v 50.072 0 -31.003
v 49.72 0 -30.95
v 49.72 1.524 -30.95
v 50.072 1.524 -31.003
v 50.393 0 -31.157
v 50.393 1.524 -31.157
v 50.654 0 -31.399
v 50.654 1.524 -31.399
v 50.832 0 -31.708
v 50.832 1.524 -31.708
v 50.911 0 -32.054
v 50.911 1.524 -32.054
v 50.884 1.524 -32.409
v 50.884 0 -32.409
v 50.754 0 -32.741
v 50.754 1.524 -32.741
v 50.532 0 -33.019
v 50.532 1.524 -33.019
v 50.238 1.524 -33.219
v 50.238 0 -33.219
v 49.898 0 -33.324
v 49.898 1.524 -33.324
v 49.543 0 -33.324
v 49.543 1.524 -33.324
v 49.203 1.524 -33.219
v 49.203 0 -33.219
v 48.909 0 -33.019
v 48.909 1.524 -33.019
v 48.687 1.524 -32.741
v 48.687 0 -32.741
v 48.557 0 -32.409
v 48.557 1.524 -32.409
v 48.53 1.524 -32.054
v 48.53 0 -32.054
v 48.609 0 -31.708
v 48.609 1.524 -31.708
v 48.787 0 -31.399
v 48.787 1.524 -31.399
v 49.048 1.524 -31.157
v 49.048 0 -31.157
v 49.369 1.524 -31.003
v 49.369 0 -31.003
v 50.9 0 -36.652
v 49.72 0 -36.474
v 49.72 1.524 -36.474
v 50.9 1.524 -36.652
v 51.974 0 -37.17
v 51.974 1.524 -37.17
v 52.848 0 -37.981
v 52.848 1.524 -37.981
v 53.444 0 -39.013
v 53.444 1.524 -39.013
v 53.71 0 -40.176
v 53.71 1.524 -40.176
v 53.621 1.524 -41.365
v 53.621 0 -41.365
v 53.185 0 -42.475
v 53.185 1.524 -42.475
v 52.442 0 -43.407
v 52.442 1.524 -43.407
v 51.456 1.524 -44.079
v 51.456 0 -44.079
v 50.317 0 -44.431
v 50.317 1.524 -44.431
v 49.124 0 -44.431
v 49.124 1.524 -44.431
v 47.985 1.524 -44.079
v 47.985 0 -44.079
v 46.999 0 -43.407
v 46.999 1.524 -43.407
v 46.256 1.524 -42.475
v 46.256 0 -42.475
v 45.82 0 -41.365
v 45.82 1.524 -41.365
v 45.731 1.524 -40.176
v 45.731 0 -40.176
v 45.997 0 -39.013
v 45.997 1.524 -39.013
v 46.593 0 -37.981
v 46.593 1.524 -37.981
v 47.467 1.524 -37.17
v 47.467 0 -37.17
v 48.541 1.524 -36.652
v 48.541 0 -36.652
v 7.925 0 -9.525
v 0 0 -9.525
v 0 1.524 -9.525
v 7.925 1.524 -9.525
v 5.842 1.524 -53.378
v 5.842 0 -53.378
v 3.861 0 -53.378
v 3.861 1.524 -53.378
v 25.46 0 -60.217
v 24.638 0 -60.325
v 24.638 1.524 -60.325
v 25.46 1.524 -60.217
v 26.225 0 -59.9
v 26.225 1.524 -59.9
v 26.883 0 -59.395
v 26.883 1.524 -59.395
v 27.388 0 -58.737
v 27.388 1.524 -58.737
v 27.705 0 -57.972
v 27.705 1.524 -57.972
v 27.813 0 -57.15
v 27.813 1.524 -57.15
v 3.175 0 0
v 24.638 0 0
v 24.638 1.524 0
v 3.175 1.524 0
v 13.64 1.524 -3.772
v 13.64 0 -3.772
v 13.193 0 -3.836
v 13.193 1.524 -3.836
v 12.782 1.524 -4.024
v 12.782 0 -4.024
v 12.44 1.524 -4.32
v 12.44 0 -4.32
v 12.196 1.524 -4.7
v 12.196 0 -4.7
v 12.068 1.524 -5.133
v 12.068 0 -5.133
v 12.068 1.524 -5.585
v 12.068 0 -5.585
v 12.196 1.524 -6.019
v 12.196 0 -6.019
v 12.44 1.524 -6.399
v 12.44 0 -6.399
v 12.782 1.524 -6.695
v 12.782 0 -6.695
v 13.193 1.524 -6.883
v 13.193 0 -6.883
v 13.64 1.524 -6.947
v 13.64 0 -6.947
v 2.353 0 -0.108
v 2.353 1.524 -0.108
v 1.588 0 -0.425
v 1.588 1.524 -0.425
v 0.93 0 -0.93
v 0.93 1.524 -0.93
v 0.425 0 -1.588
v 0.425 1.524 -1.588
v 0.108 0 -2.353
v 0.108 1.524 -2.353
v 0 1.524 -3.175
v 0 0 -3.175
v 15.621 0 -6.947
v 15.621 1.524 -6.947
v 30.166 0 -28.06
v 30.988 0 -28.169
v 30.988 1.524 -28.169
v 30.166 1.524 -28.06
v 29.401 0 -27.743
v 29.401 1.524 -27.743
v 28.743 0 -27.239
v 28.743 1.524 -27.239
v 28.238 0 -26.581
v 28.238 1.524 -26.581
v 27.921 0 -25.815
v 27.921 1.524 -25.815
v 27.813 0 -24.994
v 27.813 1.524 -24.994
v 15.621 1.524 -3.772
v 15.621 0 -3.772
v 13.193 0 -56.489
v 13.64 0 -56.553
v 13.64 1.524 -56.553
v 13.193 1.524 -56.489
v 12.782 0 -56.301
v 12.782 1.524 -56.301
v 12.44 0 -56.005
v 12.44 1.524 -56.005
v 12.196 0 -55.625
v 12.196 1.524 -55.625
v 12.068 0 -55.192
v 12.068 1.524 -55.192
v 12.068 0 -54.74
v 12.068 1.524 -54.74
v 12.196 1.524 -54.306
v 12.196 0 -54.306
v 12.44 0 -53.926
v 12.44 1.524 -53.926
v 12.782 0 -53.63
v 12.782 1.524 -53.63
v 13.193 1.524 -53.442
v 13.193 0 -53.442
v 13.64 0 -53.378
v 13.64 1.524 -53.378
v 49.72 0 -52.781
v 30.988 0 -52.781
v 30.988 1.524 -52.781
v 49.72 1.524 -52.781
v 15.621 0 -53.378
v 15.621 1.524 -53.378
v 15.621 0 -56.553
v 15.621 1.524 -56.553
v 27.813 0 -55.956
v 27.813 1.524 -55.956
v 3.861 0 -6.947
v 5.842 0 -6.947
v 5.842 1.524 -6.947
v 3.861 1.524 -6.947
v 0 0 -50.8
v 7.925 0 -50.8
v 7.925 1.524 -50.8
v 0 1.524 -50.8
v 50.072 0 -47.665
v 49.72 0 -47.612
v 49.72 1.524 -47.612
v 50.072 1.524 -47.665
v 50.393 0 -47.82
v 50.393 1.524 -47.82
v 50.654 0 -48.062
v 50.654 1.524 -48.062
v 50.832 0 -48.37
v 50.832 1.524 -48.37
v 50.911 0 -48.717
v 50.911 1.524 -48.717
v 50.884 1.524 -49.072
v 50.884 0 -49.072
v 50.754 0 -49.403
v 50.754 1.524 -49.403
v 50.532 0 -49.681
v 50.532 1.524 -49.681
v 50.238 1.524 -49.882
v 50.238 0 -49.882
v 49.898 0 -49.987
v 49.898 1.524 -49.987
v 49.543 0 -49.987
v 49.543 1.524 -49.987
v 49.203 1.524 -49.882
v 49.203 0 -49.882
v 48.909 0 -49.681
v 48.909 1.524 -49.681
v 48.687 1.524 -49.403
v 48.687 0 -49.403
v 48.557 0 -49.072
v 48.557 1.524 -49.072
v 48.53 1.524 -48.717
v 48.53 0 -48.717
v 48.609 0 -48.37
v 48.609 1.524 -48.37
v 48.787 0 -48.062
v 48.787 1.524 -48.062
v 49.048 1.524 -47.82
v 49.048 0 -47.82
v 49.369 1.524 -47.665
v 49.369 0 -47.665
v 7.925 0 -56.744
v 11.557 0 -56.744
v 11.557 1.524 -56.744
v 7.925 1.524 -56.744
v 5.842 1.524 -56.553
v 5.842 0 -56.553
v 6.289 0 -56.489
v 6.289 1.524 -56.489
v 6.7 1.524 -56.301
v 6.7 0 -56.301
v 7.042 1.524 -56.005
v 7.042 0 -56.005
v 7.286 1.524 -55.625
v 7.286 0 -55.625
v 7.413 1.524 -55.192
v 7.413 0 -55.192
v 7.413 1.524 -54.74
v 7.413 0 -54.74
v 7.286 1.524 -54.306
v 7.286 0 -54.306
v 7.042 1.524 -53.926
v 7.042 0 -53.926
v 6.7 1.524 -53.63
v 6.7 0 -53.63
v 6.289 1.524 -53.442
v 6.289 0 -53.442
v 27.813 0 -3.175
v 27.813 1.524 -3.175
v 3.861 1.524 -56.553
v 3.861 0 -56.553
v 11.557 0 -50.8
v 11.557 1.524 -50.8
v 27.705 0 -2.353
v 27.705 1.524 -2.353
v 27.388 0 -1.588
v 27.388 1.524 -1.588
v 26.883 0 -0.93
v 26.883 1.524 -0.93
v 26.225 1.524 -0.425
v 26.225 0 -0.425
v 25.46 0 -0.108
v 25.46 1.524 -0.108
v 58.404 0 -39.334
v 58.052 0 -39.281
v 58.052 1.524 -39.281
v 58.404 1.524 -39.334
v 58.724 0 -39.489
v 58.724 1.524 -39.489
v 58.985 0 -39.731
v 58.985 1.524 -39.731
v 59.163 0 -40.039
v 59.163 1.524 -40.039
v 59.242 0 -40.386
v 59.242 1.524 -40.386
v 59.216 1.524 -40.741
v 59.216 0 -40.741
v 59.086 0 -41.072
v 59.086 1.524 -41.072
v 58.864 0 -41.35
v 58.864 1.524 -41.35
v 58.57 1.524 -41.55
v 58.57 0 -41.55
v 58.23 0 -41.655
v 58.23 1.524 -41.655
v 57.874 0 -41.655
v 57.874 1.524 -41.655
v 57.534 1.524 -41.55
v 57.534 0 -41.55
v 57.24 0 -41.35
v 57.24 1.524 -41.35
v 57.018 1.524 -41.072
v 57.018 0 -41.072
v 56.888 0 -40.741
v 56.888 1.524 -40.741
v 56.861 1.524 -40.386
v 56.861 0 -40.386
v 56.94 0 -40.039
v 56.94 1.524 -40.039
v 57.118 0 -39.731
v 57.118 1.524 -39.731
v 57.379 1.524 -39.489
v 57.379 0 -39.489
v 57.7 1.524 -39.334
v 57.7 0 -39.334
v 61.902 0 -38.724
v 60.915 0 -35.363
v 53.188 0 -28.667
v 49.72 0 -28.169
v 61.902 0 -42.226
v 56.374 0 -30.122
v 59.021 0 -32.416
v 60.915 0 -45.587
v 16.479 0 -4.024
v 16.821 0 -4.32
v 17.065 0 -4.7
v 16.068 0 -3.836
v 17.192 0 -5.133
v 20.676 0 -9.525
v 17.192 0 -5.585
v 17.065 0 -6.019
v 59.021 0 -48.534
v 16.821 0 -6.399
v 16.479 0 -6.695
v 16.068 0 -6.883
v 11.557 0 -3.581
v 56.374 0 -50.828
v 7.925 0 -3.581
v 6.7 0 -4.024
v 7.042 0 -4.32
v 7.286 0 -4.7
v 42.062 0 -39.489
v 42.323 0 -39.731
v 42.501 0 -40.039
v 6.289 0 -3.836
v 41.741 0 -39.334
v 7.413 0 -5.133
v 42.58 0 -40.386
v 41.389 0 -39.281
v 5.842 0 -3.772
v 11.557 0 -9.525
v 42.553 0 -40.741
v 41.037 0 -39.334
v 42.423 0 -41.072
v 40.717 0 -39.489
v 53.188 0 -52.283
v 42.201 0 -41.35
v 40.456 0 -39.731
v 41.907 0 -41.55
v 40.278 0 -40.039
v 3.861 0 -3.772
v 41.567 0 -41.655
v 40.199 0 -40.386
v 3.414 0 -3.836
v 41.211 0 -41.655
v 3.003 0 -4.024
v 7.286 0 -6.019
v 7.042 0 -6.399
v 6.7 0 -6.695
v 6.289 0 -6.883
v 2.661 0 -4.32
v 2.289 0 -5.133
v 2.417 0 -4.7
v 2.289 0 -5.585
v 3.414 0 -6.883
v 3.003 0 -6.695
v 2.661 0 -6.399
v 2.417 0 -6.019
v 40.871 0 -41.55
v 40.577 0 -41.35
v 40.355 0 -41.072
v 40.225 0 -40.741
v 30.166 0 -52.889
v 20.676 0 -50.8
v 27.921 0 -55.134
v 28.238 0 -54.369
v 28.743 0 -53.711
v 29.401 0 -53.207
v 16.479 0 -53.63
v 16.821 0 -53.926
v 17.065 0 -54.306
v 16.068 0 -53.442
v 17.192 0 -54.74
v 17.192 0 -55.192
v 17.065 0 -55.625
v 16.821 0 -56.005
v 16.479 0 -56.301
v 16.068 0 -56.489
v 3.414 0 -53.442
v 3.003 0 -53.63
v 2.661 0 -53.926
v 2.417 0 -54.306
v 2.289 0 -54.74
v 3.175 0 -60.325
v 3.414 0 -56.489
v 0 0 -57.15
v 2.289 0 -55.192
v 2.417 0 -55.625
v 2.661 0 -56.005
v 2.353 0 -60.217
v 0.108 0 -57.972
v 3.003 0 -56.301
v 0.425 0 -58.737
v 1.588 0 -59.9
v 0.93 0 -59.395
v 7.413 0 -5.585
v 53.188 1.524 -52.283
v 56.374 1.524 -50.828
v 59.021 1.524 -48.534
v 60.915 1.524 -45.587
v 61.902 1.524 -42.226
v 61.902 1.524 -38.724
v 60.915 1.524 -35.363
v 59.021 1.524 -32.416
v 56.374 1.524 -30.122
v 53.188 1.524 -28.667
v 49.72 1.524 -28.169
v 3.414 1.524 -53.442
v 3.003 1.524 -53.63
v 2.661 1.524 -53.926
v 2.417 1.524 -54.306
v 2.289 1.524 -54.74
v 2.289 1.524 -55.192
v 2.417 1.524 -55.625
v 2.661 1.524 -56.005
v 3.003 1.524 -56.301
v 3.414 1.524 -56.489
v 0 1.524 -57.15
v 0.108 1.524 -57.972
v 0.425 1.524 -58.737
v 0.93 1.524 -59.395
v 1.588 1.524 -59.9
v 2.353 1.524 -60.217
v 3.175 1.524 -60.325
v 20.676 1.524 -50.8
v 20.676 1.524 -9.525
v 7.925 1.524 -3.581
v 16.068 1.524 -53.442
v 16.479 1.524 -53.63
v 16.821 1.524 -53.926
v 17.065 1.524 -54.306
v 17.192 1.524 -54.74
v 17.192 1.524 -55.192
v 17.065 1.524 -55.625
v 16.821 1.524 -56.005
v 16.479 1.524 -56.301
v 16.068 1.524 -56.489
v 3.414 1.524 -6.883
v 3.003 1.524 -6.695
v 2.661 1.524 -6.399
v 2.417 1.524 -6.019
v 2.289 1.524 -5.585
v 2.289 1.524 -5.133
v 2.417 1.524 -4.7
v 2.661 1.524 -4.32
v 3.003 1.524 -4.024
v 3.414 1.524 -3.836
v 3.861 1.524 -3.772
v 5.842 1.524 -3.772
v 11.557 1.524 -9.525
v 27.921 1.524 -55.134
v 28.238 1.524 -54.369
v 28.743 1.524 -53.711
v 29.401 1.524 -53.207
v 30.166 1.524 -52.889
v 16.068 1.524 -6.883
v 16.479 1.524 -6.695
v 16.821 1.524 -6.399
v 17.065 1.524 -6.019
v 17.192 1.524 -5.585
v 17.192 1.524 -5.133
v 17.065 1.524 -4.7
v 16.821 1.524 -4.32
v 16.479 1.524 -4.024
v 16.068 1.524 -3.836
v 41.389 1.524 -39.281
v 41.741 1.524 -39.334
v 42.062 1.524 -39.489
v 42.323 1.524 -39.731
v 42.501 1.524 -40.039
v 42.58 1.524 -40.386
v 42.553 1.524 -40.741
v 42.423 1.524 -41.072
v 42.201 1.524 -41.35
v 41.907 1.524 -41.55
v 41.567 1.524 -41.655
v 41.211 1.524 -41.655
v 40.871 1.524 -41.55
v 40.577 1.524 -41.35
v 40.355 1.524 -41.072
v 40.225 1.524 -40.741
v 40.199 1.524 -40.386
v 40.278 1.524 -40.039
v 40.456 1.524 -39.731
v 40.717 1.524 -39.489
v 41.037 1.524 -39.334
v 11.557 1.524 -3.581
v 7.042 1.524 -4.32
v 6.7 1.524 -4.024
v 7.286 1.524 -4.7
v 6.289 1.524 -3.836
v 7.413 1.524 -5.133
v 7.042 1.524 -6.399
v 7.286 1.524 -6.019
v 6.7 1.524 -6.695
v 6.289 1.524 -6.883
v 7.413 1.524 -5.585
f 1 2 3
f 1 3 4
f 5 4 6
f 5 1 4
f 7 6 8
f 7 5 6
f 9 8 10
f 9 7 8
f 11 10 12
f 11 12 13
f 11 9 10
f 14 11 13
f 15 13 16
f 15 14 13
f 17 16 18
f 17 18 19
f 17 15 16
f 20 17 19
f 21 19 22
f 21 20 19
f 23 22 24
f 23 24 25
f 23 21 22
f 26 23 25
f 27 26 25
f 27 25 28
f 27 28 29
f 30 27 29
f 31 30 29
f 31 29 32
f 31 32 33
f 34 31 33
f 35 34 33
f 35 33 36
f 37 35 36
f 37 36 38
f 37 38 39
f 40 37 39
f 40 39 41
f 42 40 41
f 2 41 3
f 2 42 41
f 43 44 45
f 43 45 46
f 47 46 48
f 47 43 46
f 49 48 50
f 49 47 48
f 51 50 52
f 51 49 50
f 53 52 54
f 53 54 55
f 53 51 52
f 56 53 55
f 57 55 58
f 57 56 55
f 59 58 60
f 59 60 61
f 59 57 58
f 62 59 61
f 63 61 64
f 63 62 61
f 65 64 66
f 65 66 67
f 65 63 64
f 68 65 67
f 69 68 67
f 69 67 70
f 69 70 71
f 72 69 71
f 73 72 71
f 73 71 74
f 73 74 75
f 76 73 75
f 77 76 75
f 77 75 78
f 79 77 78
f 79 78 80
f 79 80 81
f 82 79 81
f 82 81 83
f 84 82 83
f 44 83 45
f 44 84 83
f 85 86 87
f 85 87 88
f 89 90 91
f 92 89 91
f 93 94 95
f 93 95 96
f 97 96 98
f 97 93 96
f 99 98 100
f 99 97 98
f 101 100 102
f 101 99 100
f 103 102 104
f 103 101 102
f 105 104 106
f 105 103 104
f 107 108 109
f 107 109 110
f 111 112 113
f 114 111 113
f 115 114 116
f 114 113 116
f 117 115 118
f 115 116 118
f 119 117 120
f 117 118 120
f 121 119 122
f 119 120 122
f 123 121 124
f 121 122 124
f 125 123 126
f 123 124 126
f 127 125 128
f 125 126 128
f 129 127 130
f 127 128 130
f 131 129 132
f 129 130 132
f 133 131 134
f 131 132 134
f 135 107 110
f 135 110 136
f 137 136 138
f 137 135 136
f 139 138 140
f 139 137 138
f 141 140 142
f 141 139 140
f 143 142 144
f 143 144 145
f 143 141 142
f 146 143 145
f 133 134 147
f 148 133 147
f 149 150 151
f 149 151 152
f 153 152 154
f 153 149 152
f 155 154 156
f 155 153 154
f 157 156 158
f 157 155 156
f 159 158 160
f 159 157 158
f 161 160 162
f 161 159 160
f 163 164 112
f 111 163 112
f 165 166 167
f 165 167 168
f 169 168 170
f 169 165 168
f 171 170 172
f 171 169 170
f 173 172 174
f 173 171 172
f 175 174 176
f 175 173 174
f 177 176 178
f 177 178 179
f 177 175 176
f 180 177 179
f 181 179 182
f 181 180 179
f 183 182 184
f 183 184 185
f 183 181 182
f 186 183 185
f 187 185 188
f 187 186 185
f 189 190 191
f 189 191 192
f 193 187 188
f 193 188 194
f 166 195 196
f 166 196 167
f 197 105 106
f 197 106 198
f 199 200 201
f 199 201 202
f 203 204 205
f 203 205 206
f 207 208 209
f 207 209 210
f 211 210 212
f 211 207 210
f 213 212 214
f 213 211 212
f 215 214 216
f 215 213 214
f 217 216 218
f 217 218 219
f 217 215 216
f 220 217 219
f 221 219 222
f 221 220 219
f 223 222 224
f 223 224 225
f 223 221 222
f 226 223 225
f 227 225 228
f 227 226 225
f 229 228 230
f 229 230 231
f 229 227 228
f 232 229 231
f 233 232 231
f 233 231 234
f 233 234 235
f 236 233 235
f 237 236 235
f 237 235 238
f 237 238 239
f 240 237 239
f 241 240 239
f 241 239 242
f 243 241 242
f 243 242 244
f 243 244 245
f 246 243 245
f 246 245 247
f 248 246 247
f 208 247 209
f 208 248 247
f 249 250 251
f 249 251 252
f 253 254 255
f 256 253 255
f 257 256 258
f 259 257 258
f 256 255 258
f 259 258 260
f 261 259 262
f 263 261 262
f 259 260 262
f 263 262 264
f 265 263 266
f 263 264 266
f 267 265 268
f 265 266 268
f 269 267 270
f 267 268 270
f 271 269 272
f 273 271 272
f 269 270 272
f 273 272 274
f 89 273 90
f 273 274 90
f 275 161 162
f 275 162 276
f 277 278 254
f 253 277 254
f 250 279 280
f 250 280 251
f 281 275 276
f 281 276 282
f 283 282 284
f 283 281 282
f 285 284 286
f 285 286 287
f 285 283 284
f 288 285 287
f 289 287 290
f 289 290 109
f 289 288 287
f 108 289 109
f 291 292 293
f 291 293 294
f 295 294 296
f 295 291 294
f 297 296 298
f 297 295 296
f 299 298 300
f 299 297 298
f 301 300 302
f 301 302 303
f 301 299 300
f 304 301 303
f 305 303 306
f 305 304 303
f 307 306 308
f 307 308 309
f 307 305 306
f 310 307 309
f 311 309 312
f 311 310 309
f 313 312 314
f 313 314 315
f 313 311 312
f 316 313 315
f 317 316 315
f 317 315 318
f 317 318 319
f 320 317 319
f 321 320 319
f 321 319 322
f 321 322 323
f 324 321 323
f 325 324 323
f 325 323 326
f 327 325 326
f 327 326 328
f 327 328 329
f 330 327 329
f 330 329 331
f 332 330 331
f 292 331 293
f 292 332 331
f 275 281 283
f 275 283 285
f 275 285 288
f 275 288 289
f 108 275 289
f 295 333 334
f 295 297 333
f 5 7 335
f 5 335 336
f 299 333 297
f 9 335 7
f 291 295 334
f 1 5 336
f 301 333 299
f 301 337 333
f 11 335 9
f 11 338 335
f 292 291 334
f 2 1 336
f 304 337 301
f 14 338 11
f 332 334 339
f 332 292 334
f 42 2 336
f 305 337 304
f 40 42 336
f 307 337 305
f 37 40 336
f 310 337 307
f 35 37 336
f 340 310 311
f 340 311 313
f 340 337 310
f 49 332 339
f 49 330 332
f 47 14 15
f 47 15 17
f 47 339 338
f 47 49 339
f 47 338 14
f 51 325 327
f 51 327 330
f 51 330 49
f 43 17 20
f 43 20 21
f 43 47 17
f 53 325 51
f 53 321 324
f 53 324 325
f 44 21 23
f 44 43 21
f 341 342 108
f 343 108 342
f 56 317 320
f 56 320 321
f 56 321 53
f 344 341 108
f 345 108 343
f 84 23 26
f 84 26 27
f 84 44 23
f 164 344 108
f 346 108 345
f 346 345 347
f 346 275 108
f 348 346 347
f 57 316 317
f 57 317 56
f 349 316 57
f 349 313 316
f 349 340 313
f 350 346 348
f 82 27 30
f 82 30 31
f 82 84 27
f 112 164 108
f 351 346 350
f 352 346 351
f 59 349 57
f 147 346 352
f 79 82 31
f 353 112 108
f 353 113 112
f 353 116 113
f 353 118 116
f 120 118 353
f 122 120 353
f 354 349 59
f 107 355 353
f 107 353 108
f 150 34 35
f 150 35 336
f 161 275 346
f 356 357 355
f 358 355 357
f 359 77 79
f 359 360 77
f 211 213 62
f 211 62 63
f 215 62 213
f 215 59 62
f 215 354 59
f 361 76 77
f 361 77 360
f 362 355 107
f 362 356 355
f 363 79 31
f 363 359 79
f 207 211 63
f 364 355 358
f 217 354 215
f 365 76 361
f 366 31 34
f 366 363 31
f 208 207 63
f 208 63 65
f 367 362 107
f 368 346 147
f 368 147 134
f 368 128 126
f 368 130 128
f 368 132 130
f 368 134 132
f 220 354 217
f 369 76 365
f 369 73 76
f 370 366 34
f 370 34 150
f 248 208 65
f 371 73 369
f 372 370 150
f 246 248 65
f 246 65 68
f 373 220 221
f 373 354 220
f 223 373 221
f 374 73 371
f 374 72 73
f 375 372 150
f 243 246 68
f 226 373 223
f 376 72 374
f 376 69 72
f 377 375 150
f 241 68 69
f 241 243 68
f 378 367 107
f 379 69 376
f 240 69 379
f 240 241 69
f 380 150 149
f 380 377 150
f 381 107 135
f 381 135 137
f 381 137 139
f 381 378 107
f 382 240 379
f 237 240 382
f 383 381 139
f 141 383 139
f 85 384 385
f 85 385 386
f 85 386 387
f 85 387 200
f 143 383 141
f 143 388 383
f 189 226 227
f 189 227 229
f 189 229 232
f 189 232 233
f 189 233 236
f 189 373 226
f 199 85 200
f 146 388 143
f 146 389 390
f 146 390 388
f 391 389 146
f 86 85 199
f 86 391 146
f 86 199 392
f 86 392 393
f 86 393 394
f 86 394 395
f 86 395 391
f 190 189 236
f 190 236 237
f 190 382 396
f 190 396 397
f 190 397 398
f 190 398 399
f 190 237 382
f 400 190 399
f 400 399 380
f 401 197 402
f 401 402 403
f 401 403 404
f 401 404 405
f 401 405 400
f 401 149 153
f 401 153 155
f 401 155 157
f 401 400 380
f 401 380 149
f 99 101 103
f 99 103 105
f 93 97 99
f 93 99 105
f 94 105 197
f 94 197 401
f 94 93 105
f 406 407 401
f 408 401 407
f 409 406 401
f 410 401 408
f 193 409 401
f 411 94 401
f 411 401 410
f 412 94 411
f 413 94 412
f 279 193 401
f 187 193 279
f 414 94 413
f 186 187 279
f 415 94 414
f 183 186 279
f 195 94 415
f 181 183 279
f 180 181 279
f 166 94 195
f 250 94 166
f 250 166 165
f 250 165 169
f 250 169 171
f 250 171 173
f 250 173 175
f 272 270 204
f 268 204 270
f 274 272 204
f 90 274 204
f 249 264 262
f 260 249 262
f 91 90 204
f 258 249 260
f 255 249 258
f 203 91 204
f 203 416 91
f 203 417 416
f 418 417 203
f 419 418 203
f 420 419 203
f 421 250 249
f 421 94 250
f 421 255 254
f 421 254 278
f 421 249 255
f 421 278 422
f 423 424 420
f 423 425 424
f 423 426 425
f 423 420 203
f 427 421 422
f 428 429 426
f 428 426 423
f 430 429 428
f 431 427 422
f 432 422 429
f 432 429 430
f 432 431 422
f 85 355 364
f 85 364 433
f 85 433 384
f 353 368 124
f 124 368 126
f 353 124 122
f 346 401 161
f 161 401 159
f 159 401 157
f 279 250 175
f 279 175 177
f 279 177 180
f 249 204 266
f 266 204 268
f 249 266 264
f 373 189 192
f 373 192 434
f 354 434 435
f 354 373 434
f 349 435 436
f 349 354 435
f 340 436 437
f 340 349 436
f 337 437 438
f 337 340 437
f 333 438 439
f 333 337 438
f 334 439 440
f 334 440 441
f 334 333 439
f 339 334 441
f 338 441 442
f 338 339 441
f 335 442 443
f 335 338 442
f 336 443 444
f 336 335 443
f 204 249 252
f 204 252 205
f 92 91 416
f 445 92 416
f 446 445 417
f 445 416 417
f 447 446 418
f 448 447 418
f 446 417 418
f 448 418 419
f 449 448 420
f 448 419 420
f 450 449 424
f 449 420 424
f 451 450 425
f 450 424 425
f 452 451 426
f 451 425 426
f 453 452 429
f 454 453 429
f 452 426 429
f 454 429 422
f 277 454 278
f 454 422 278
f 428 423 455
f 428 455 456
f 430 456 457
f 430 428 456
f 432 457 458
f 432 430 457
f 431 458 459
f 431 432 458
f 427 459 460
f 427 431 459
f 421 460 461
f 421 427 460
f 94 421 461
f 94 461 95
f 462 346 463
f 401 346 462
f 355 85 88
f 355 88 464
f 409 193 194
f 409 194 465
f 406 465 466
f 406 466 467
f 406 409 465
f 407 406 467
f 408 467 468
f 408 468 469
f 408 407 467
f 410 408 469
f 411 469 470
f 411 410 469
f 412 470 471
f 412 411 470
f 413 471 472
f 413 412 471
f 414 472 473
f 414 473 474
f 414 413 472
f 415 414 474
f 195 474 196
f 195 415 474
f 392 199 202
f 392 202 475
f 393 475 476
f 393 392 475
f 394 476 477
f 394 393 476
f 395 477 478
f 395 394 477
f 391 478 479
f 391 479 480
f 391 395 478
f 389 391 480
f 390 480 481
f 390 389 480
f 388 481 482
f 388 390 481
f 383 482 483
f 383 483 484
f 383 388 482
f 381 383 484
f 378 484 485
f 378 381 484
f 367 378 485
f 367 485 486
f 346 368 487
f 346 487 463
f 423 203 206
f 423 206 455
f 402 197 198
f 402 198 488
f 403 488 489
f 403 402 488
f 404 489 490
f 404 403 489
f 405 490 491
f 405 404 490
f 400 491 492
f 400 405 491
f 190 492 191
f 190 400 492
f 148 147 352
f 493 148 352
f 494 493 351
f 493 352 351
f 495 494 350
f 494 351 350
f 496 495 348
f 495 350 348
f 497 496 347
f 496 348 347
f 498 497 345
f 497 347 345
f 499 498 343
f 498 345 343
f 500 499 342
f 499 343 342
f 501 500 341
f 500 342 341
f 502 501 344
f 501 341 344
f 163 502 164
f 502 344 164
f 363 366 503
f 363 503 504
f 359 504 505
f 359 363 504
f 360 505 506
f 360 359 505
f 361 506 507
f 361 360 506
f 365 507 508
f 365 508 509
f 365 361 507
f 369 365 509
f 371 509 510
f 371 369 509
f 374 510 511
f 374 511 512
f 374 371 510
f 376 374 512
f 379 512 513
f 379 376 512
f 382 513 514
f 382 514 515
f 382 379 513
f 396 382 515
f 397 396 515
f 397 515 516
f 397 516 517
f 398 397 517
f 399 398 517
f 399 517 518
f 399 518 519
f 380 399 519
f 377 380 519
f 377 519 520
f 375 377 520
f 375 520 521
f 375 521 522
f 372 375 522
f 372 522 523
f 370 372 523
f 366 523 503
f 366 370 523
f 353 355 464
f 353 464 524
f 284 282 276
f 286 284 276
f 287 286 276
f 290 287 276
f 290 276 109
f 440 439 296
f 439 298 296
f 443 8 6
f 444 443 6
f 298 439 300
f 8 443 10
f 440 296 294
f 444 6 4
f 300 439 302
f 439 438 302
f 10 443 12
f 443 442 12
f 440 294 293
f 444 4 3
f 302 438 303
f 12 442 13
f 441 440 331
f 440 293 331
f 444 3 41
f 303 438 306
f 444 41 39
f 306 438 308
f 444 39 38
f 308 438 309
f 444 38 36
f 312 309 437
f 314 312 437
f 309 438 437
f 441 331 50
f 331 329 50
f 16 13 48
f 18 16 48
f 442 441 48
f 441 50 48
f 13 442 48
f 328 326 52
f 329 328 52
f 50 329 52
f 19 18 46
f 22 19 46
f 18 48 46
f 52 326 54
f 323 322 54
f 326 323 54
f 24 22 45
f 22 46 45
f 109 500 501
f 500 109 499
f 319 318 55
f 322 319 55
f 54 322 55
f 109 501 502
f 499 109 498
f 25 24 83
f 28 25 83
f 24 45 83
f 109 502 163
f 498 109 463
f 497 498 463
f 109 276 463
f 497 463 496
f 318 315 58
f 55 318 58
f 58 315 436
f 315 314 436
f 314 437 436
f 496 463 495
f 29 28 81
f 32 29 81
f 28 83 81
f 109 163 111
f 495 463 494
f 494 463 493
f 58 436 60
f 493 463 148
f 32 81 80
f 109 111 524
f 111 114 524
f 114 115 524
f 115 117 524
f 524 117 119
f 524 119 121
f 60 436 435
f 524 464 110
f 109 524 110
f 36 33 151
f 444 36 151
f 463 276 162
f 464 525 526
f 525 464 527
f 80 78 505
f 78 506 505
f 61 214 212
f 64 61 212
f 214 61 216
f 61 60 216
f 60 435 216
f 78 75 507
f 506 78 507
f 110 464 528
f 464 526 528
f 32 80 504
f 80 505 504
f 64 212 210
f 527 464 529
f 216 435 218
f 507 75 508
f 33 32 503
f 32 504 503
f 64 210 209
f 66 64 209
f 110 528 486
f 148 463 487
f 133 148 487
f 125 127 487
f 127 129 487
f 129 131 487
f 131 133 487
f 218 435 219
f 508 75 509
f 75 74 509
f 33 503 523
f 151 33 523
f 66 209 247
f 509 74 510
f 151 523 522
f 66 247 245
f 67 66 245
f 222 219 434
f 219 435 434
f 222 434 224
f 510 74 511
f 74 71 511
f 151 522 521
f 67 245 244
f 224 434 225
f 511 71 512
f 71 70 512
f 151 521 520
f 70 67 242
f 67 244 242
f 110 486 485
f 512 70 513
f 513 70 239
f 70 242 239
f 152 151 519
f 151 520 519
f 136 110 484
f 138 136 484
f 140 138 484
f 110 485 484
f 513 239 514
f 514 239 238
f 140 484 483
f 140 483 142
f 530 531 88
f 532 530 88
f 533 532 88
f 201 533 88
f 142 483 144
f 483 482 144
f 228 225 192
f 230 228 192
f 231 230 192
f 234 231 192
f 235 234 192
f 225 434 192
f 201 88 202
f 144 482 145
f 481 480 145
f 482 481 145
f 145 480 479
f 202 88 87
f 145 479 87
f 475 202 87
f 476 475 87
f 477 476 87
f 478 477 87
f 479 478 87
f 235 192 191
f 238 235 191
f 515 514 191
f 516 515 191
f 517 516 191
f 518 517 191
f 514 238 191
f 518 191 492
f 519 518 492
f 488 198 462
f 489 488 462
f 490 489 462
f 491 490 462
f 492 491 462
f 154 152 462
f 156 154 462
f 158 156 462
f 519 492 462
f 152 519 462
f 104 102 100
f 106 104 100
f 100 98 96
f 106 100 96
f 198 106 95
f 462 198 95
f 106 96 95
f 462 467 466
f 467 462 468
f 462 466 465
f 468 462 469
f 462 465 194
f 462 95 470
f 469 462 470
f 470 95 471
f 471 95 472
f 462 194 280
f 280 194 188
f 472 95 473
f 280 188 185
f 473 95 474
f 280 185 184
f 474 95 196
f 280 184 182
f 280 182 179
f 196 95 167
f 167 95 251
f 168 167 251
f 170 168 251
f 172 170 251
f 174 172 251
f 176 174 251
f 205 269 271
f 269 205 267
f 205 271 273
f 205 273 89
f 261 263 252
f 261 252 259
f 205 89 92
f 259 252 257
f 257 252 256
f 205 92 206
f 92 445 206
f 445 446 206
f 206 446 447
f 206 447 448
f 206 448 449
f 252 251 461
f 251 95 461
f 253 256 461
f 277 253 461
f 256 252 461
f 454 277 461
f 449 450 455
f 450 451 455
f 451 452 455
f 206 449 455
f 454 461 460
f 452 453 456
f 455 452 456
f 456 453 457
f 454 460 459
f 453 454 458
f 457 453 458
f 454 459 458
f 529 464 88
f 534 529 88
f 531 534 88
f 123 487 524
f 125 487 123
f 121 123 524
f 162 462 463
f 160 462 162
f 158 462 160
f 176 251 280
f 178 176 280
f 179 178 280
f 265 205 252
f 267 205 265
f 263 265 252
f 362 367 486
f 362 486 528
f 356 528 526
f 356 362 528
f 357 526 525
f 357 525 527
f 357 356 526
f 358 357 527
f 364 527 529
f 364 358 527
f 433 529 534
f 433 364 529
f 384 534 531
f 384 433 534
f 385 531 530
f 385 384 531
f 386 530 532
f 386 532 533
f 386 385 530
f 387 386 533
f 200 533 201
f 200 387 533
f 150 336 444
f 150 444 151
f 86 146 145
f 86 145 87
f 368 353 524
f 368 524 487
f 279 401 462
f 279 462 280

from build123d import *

# Parameters (mm, degrees)
SKETCH1_R      = 4.0005
SKETCH1_R_2    = 1.1938
EXTRUDE1_DEPTH = 1.524


with BuildPart() as part:
    # Sketch1 → Extrude1 (new body)
    with BuildSketch(Plane(origin=(0, 0, 0), x_dir=(1, 0, 0), z_dir=(0, 1, 0))):
        with BuildLine():
            Line((0, 3.175), (0, 9.525))
            Line((0, 9.525), (7.9248, 9.525))
            Line((7.9248, 9.525), (7.9248, 3.5814))
            Line((7.9248, 3.5814), (11.557, 3.5814))
            Line((11.557, 3.5814), (11.557, 9.525))
            Line((11.557, 9.525), (20.6756, 9.525))
            Line((20.6756, 9.525), (20.6756, 50.8))
            Line((20.6756, 50.8), (11.557, 50.8))
            Line((11.557, 50.8), (11.557, 56.7436))
            Line((11.557, 56.7436), (7.9248, 56.7436))
            Line((7.9248, 56.7436), (7.9248, 50.8))
            Line((7.9248, 50.8), (0, 50.8))
            Line((0, 50.8), (0, 57.15))
            ThreePointArc((0, 57.15), (0.92993597, 59.39506403), (3.175, 60.325))
            Line((3.175, 60.325), (24.638, 60.325))
            ThreePointArc((24.638, 60.325), (26.88306403, 59.39506403), (27.813, 57.15))
            Line((27.813, 57.15), (27.813, 55.9562))
            ThreePointArc((27.813, 55.9562), (28.74293597, 53.71113597), (30.988, 52.7812))
            Line((30.988, 52.7812), (49.7205, 52.7812))
            ThreePointArc((49.7205, 52.7812), (62.0268, 40.4749), (49.7205, 28.1686))
            Line((49.7205, 28.1686), (30.988, 28.1686))
            ThreePointArc((30.988, 28.1686), (28.74293597, 27.23866403), (27.813, 24.9936))
            Line((27.813, 24.9936), (27.813, 3.175))
            ThreePointArc((27.813, 3.175), (26.88306403, 0.92993597), (24.638, 0))
            Line((24.638, 0), (3.175, 0))
            ThreePointArc((3.175, 0), (0.92993597, 0.92993597), (0, 3.175))
        make_face()
        with Locations(Location((49.7205, 40.4749, 0), (0, 0, 270))):  # turned: the seam where the file's is
            Circle(SKETCH1_R, mode=Mode.SUBTRACT)
        with Locations(Location((41.3893, 40.4749, 0), (0, 0, 270))):  # turned: the seam where the file's is
            Circle(SKETCH1_R_2, mode=Mode.SUBTRACT)
        with Locations(Location((49.7205, 32.1437, 0), (0, 0, 270))):  # turned: the seam where the file's is
            Circle(SKETCH1_R_2, mode=Mode.SUBTRACT)
        with Locations(Location((58.0517, 40.4749, 0), (0, 0, 270))):  # turned: the seam where the file's is
            Circle(SKETCH1_R_2, mode=Mode.SUBTRACT)
        with Locations(Location((49.7205, 48.8061, 0), (0, 0, 270))):  # turned: the seam where the file's is
            Circle(SKETCH1_R_2, mode=Mode.SUBTRACT)
        with BuildLine():
            Line((5.842, 53.3781), (3.8608, 53.3781))
            ThreePointArc((3.8608, 53.3781), (2.2733, 54.9656), (3.8608, 56.5531))
            Line((3.8608, 56.5531), (5.842, 56.5531))
            ThreePointArc((5.842, 56.5531), (7.4295, 54.9656), (5.842, 53.3781))
        make_face(mode=Mode.SUBTRACT)
        with BuildLine():
            Line((13.6398, 6.9469), (15.621, 6.9469))
            ThreePointArc((15.621, 6.9469), (17.2085, 5.3594), (15.621, 3.7719))
            Line((15.621, 3.7719), (13.6398, 3.7719))
            ThreePointArc((13.6398, 3.7719), (12.0523, 5.3594), (13.6398, 6.9469))
        make_face(mode=Mode.SUBTRACT)
        with BuildLine():
            Line((3.8608, 3.7719), (5.842, 3.7719))
            ThreePointArc((5.842, 3.7719), (7.4295, 5.3594), (5.842, 6.9469))
            Line((5.842, 6.9469), (3.8608, 6.9469))
            ThreePointArc((3.8608, 6.9469), (2.2733, 5.3594), (3.8608, 3.7719))
        make_face(mode=Mode.SUBTRACT)
        with BuildLine():
            Line((15.621, 56.5531), (13.6398, 56.5531))
            ThreePointArc((13.6398, 56.5531), (12.0523, 54.9656), (13.6398, 53.3781))
            Line((13.6398, 53.3781), (15.621, 53.3781))
            ThreePointArc((15.621, 53.3781), (17.2085, 54.9656), (15.621, 56.5531))
        make_face(mode=Mode.SUBTRACT)
    extrude(amount=EXTRUDE1_DEPTH)


solid = part.part
